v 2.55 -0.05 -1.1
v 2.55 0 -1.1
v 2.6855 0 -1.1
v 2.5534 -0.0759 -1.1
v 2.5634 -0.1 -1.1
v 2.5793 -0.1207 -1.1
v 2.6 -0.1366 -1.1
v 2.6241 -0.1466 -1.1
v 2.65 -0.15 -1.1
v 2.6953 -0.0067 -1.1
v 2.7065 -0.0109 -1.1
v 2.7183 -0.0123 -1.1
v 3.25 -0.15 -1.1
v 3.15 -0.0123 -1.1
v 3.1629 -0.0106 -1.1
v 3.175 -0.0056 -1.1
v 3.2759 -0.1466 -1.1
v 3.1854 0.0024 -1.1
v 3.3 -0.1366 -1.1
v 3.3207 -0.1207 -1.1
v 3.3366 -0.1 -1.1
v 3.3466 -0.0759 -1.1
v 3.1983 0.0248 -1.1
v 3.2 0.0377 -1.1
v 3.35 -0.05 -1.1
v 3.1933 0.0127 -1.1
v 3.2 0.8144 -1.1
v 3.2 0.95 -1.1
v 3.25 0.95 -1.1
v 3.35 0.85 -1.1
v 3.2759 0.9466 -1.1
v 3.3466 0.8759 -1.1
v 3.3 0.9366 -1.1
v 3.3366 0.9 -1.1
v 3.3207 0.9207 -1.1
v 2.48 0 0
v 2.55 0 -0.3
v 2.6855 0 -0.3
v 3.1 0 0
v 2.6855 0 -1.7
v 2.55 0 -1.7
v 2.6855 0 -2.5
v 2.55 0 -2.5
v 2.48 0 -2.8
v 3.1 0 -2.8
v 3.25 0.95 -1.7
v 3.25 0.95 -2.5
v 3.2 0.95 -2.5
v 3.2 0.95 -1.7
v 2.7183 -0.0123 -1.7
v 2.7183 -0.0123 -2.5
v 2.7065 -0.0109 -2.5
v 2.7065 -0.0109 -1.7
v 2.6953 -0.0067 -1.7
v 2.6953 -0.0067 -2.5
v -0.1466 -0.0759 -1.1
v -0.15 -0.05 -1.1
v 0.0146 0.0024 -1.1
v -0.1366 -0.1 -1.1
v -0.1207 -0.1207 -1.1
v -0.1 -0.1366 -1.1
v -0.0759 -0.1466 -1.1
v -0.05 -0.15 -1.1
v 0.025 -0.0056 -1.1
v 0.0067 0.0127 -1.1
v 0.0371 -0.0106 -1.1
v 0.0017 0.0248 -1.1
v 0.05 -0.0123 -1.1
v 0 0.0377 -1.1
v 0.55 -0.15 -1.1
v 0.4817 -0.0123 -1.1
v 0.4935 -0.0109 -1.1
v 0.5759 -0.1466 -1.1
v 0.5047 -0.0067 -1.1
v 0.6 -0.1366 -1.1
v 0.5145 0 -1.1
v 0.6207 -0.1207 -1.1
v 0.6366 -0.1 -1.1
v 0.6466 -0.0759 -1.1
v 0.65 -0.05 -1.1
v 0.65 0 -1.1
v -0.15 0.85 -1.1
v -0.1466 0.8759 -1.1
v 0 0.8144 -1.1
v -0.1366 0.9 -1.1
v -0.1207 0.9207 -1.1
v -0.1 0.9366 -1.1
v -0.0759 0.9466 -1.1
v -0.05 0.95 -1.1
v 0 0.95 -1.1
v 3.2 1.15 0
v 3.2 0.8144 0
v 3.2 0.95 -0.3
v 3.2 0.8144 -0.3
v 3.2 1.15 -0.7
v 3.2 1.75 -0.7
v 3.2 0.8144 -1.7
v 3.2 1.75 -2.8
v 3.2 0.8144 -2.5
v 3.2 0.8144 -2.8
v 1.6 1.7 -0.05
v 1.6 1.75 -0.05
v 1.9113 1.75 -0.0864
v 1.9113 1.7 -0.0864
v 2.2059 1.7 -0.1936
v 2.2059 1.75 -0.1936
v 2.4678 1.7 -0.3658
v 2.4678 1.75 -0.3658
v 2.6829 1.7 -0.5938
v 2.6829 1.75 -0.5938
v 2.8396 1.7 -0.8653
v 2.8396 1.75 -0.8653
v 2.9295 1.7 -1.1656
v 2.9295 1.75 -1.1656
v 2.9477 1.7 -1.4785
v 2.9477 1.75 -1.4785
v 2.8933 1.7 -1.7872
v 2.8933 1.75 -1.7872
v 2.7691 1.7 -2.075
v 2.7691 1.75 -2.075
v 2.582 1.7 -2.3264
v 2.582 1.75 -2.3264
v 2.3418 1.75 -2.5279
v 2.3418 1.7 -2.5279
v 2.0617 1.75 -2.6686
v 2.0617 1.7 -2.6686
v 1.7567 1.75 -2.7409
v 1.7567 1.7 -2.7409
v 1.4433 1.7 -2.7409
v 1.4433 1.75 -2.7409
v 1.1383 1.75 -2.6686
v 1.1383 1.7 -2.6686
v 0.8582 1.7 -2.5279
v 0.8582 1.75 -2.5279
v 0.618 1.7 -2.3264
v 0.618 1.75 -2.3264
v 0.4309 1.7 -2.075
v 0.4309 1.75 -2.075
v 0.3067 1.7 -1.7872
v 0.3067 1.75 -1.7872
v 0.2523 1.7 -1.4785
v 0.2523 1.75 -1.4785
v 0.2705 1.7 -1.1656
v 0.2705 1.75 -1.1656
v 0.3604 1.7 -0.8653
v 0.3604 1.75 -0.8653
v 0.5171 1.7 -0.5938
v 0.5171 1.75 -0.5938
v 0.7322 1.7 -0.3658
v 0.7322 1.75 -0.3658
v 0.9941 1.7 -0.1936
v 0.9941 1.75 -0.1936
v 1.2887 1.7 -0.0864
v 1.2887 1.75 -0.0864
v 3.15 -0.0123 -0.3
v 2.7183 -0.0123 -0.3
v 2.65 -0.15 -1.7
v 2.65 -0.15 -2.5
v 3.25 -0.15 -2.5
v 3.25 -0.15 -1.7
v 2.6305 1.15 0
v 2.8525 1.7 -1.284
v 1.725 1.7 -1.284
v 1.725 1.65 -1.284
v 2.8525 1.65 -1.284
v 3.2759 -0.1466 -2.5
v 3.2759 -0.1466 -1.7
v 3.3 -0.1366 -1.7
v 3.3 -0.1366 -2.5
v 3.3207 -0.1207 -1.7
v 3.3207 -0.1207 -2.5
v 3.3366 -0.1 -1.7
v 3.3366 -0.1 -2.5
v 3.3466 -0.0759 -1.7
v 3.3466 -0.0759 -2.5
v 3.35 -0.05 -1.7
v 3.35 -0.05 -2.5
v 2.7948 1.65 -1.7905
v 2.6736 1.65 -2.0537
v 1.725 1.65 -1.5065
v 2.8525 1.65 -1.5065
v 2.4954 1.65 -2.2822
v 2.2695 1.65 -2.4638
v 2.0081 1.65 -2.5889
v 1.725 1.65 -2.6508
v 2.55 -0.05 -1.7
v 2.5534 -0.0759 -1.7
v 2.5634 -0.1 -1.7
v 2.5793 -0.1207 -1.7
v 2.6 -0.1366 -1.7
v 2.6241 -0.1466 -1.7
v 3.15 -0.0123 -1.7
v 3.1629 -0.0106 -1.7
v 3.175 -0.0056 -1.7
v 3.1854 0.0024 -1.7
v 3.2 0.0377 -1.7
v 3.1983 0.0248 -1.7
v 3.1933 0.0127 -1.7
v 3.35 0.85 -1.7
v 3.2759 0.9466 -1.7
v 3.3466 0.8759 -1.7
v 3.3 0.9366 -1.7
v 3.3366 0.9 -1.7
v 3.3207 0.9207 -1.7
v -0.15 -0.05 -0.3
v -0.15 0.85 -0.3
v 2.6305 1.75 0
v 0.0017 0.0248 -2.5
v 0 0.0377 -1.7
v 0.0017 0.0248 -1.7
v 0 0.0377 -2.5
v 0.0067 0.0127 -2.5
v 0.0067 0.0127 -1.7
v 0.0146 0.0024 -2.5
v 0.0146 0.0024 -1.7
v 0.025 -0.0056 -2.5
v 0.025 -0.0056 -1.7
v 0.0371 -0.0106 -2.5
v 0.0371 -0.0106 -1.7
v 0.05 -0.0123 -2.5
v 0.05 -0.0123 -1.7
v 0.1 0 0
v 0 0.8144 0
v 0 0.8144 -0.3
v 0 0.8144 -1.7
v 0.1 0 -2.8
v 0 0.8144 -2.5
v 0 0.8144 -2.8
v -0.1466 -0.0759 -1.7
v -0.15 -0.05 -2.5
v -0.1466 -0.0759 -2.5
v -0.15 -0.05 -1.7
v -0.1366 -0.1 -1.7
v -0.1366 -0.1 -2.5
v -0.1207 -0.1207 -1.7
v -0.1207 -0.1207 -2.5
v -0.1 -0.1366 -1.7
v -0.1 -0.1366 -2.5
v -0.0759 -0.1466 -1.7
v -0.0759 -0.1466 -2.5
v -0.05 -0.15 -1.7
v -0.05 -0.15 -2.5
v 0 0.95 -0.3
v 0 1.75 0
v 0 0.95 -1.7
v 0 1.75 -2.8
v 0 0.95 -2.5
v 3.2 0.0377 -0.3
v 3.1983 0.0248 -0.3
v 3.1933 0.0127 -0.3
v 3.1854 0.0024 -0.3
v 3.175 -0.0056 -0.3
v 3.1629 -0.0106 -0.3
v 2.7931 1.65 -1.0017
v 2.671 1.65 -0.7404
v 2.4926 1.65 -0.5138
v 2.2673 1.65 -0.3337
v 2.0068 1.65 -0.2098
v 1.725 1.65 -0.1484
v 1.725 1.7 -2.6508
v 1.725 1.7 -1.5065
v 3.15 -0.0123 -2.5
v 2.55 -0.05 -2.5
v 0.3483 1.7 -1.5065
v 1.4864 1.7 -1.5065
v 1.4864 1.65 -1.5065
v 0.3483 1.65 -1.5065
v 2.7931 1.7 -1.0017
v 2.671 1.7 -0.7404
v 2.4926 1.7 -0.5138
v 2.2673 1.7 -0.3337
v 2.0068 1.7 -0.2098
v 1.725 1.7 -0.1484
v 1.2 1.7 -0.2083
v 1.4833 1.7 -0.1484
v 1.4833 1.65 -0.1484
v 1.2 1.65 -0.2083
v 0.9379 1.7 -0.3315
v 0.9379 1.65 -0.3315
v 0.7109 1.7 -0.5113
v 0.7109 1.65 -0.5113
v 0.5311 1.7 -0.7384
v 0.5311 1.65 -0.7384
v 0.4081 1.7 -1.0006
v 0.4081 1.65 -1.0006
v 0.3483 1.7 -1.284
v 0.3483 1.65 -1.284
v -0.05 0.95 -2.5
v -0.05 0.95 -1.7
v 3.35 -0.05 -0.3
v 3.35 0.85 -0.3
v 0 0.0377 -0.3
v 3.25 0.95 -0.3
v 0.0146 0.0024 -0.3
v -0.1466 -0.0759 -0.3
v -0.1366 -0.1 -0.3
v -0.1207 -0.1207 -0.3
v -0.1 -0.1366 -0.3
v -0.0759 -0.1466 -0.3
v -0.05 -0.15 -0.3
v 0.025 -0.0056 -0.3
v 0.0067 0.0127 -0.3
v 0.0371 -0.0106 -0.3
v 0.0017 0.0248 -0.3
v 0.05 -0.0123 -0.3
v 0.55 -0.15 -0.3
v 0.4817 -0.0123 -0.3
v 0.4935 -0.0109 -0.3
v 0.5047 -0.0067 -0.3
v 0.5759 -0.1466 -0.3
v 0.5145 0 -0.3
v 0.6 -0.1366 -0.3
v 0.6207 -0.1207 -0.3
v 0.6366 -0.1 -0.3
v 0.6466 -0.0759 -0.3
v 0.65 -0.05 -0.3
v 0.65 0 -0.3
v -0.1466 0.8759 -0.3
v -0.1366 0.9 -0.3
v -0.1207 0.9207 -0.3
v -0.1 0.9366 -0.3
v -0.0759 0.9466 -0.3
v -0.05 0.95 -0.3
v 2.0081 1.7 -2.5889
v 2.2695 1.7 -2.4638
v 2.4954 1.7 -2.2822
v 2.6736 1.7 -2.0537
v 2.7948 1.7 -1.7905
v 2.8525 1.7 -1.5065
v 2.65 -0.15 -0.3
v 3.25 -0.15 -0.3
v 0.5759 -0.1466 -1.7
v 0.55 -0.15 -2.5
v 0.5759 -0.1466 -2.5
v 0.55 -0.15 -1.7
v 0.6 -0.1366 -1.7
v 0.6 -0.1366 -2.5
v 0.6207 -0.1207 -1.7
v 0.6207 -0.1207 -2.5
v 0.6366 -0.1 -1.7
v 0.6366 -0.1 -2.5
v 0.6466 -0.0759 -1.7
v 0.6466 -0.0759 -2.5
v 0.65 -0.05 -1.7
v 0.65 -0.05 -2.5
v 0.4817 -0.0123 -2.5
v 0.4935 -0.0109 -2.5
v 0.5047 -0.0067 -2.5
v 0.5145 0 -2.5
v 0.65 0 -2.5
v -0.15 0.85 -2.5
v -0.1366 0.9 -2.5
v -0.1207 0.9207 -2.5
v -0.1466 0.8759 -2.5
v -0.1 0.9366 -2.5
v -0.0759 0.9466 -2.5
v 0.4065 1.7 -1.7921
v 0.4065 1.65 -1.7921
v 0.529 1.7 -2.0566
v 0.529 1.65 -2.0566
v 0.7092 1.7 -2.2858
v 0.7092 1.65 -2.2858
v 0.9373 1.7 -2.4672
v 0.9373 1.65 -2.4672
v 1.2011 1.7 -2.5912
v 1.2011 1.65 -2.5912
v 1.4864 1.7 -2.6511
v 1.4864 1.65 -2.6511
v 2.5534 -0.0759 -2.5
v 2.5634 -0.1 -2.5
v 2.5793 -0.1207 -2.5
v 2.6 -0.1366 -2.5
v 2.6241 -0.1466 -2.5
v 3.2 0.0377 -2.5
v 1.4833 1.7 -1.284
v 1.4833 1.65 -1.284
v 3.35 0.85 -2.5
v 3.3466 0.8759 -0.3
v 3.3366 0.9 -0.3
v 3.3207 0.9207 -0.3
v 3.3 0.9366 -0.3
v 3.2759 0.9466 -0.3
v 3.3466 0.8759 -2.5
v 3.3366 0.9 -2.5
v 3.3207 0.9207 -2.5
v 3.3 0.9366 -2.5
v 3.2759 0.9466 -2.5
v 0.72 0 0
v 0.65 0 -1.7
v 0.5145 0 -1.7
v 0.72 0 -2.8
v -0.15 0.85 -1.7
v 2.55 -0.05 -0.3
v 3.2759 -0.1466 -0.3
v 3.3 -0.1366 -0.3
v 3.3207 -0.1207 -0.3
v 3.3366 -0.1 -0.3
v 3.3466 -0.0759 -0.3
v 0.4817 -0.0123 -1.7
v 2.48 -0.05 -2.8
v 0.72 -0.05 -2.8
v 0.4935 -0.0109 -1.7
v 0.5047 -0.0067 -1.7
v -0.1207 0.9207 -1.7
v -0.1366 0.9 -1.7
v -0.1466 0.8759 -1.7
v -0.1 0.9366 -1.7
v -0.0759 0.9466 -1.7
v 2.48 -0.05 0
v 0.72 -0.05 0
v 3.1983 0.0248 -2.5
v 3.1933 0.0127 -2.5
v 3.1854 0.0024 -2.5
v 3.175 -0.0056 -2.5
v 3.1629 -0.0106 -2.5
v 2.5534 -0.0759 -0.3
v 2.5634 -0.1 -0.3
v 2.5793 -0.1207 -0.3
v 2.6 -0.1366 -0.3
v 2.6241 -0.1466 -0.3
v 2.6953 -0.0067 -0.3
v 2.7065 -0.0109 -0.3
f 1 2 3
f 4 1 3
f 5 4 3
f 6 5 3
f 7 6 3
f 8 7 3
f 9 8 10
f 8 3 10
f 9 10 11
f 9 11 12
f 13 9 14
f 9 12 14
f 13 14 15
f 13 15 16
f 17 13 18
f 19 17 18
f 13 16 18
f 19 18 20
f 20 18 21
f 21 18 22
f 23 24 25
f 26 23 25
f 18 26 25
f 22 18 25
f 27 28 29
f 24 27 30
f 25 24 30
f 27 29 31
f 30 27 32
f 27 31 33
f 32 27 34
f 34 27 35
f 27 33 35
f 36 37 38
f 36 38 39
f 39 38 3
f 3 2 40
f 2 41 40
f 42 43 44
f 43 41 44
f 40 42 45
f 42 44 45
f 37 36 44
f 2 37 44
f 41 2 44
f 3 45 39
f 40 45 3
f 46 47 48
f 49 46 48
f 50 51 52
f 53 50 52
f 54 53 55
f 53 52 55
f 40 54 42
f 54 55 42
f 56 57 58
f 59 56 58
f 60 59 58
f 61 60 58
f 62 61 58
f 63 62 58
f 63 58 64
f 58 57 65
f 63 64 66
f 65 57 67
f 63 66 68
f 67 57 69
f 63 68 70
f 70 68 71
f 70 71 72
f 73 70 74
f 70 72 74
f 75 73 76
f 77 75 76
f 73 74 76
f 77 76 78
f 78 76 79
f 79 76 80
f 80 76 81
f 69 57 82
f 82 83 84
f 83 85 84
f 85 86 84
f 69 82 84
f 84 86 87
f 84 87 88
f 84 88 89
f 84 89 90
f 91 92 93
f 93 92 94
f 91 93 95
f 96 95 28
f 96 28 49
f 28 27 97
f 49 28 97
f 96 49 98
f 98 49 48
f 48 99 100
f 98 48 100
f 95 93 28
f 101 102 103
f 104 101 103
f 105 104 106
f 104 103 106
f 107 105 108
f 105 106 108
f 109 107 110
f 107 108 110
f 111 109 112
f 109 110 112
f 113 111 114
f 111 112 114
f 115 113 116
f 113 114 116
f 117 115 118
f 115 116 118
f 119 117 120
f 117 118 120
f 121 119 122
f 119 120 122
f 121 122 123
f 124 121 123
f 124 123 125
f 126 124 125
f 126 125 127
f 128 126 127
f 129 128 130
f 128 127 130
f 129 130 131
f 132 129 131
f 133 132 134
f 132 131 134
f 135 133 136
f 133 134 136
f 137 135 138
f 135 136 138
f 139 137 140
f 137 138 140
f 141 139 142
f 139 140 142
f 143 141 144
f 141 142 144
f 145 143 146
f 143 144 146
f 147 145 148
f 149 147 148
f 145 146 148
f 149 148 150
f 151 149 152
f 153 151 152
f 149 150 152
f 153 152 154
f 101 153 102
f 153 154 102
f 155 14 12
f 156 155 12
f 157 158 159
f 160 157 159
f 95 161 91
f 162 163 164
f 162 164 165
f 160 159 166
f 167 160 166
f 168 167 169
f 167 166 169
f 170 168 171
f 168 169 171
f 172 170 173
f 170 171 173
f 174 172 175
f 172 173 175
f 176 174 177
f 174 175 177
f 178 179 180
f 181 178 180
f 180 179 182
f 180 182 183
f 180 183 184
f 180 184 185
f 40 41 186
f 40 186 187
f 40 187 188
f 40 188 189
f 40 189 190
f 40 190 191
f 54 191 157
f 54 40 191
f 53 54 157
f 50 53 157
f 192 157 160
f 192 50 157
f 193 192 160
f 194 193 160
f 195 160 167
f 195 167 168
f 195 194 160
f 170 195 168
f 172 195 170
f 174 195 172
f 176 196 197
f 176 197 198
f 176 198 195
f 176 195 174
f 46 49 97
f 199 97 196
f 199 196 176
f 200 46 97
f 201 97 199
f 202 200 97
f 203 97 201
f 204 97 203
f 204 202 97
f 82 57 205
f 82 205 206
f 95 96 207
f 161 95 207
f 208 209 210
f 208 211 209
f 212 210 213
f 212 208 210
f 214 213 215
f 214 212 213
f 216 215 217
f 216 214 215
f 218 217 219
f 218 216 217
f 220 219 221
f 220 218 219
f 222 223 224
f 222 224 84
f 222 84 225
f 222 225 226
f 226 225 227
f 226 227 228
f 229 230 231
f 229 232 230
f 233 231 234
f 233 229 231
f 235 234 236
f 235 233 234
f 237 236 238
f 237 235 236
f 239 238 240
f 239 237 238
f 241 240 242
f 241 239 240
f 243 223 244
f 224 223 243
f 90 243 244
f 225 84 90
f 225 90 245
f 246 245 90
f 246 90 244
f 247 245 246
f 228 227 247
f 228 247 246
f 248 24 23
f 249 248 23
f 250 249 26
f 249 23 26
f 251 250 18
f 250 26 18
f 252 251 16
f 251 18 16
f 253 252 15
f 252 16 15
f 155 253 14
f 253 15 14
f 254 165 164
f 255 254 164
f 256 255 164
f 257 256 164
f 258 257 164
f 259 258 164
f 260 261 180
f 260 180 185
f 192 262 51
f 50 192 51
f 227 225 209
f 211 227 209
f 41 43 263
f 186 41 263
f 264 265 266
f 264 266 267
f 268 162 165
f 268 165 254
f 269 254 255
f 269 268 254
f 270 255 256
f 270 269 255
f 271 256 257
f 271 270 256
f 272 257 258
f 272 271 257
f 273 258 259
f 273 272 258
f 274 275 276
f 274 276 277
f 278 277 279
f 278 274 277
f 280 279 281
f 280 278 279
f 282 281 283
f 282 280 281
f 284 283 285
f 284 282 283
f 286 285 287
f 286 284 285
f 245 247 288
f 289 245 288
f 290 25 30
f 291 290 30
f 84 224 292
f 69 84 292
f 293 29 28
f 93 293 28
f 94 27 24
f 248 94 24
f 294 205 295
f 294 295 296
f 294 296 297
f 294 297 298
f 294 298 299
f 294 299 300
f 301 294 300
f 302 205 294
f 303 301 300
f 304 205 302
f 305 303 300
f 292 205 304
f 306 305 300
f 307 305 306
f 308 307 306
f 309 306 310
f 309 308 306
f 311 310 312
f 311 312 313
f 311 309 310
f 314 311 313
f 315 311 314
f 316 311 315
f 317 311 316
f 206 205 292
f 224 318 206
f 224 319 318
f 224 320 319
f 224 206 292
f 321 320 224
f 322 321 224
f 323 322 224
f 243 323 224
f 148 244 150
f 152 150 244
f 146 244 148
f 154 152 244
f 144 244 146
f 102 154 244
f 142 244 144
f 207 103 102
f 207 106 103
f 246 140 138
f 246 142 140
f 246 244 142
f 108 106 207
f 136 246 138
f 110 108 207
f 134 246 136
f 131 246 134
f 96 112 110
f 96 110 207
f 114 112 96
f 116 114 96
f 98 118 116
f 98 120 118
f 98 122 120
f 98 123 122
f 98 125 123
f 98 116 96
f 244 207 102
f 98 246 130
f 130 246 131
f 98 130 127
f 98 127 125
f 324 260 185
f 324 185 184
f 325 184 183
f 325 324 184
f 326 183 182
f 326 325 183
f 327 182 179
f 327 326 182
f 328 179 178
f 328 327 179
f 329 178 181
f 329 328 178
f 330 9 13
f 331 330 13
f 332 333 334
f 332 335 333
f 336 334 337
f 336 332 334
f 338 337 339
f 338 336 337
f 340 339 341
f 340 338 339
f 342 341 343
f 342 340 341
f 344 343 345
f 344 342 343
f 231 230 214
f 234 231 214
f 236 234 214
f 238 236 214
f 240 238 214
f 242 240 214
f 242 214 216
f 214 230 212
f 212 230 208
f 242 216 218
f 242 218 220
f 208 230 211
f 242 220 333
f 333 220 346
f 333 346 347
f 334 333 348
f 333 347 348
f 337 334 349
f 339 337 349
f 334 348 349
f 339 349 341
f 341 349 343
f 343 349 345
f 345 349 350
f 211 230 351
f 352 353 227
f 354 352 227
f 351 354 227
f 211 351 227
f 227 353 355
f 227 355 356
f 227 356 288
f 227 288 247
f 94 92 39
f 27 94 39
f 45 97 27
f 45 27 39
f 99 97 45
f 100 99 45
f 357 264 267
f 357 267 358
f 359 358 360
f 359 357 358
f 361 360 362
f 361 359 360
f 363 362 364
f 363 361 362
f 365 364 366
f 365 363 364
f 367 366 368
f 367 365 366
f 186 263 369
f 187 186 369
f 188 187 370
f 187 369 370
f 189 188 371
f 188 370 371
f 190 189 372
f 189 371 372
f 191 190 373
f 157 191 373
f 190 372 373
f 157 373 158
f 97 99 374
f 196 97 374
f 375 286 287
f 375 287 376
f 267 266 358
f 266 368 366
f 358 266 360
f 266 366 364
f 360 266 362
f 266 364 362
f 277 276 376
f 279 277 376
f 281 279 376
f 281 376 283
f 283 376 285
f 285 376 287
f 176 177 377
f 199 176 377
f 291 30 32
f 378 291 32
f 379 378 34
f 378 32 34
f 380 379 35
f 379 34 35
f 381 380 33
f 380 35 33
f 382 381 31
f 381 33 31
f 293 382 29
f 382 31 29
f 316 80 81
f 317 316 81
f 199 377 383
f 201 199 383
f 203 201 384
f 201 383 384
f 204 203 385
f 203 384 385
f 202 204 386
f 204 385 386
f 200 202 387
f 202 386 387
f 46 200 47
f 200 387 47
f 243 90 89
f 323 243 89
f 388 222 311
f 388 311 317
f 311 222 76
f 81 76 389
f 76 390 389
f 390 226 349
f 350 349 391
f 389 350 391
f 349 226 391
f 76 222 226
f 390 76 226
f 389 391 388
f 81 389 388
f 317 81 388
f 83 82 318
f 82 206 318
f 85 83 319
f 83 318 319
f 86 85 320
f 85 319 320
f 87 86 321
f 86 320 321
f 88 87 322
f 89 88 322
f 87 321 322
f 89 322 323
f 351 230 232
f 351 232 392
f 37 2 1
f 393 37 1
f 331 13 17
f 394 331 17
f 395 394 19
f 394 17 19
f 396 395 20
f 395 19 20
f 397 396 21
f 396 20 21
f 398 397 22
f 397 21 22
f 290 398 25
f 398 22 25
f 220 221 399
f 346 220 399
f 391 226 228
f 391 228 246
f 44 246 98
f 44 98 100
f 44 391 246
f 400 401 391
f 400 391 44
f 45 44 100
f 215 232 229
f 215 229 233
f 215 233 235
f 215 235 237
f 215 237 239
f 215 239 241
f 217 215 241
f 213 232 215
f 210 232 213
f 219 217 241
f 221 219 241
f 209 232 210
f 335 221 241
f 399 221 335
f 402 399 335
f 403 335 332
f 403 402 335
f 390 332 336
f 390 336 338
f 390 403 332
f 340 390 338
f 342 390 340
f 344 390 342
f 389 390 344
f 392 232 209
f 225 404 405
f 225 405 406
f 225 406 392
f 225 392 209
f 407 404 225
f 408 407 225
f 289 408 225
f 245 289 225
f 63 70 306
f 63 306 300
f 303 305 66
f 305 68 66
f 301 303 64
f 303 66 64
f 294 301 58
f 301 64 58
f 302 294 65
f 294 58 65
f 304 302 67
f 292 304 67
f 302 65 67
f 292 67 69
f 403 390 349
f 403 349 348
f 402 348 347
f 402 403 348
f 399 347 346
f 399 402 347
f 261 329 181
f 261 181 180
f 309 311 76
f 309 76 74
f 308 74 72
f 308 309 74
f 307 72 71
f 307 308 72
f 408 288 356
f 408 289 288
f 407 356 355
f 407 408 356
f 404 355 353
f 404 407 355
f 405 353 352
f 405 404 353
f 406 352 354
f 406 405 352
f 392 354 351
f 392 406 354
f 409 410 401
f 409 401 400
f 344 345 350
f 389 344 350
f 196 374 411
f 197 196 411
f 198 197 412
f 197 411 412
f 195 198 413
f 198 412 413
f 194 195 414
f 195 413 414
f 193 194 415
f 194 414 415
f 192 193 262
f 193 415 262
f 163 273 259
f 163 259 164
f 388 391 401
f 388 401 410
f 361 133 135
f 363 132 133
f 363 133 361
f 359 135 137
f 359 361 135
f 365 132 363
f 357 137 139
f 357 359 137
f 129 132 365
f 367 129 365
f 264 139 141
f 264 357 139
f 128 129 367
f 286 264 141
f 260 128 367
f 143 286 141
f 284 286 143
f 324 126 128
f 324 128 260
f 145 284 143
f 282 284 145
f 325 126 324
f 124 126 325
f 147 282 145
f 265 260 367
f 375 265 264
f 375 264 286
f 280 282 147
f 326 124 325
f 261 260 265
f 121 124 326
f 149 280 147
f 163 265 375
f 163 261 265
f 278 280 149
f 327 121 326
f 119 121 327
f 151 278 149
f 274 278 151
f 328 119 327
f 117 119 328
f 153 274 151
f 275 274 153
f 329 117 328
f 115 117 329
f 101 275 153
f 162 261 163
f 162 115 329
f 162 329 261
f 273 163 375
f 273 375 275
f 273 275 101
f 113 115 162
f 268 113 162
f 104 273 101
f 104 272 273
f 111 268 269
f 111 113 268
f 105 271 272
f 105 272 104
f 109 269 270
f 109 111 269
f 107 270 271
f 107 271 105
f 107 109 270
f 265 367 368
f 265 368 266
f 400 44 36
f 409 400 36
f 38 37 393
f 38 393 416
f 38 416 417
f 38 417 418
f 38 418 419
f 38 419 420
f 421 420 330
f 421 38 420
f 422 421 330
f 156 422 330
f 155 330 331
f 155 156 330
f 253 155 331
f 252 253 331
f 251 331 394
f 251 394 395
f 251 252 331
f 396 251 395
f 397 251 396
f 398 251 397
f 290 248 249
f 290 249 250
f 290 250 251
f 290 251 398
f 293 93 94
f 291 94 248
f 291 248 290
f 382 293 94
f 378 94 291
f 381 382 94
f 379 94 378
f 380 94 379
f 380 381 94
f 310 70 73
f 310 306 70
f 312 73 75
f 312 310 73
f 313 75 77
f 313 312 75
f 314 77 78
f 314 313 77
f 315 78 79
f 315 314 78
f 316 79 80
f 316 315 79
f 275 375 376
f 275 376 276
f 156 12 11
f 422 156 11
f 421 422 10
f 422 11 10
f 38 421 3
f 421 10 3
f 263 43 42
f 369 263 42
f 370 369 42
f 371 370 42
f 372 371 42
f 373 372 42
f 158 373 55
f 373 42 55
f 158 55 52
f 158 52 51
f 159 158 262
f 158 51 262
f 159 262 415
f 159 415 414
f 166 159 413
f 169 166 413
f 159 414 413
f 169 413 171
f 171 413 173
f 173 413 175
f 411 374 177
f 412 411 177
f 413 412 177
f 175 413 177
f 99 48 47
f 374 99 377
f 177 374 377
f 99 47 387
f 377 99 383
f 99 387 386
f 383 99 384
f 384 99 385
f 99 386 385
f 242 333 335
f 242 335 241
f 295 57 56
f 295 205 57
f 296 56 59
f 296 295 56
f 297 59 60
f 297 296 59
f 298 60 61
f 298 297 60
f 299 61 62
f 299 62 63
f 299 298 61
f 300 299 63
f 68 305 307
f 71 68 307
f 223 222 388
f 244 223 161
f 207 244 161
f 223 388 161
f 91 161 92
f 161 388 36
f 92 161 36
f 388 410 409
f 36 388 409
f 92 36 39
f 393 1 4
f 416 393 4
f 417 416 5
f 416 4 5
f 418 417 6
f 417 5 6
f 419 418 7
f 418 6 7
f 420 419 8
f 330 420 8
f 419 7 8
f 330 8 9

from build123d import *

# Parameters (mm, degrees)
SKETCH1_W              = 3.2
SKETCH1_H              = 2.8
BOSS_EXTRUDE1_DEPTH    = 1.75
CHAMFER1_SIZE          = 0.1
CHAMFER1_SIZE2         = 0.814434643
SKETCH3_W              = 0.8
SKETCH3_H              = 1.1
BOSS_EXTRUDE2_DEPTH    = 0.8
FILLET1_R              = 0.1
FILLET2_R              = 0.1
FILLET3_R              = 0.1
CUT_EXTRUDE3_DEPTH     = 1
FILLET5_R              = 0.05
FILLET6_R              = 0.05
LPATTERN1_COUNT        = 2
LPATTERN1_PITCH        = 1.4
FILLET1_OF_LPATTERN1_R = 0.1
FILLET2_OF_LPATTERN1_R = 0.1
FILLET3_OF_LPATTERN1_R = 0.1
FILLET5_OF_LPATTERN1_R = 0.05
FILLET6_OF_LPATTERN1_R = 0.05
CHAMFER2_SIZE          = 0.1
CHAMFER2_SIZE2         = 0.814434643
MIRROR2_START          = -2.5
MIRROR2_DEPTH          = 0.8
MIRROR2_START_2        = -1.1
MIRROR2_2_DEPTH        = 0.8
SKETCH7_W              = 1.76
SKETCH7_H              = 2.8
BOSS_EXTRUDE4_DEPTH    = 0.05
CUT_EXTRUDE4_DEPTH     = 0.6
SKETCH9_R              = 1.35
CUT_EXTRUDE5_DEPTH     = 0.05
CUT_EXTRUDE6_DEPTH     = 0.05


# Read off the part's stored shape, not the designer's step: Mirror2
with BuildPart() as part:
    # Sketch1 → Boss-Extrude1 (new body)
    with BuildSketch(Plane(origin=(0, 0, 0), x_dir=(1, 0, 0), z_dir=(0, 1, 0))):
        with Locations((1.6, 1.4)):
            Rectangle(SKETCH1_W, SKETCH1_H)
    extrude(amount=BOSS_EXTRUDE1_DEPTH)

    # Chamfer1
    chamfer1_edges = [part.edges().sort_by_distance(p)[0] for p in [
        (0, 0, -1.4),
    ]]
    chamfer1_side = [part.faces().sort_by_distance(p)[0] for p in [
        (1.6, 0, -1.4),
    ]]
    chamfer(chamfer1_edges, length=CHAMFER1_SIZE, length2=CHAMFER1_SIZE2, reference=chamfer1_side[0])

    # Sketch3 → Boss-Extrude2 (add)
    with BuildSketch(Plane(origin=(0, 0, -2.5), x_dir=(-1, 0, 0), z_dir=(0, 0, -1))):
        with Locations((-0.25, 0.4)):
            Rectangle(SKETCH3_W, SKETCH3_H)
    boss_extrude2 = extrude(amount=-BOSS_EXTRUDE2_DEPTH)

    # Fillet1
    fillet1_edges = [part.edges().sort_by_distance(p)[0] for p in [
        (-0.15, 0.95, -2.1),
    ]]
    fillet(fillet1_edges, radius=FILLET1_R)

    # Fillet2
    fillet2_edges = [part.edges().sort_by_distance(p)[0] for p in [
        (-0.15, -0.15, -2.1),
    ]]
    fillet(fillet2_edges, radius=FILLET2_R)

    # Fillet3
    fillet3_edges = [part.edges().sort_by_distance(p)[0] for p in [
        (0.65, -0.15, -2.1),
    ]]
    fillet(fillet3_edges, radius=FILLET3_R)

    # Sketch6 → Cut-Extrude3 (cut)
    with BuildSketch(Plane.XY.offset(-1.7)):
        Polygon((0, 0.814434643), (0, -0.012278456), (0.514539268, -0.012278456), (0.514539268, 0), (0.1, 0), align=None)
    cut_extrude3 = extrude(amount=-CUT_EXTRUDE3_DEPTH, mode=Mode.SUBTRACT)

    # Fillet5
    fillet5_edges = [part.edges().sort_by_distance(p)[0] for p in [
        (0, -0.012278456, -2.1),
    ]]
    fillet(fillet5_edges, radius=FILLET5_R)

    # Fillet6
    # the kernel refuses this fillet: 0.05 mm, written as the material it adds along each edge
    with BuildSketch(Plane(origin=(0.514539268, -0.012278456, -1.7), x_dir=(-1, 0, 0), z_dir=(0, 0, -1))) as fillet6_piece_1:
        with BuildLine():
            CenterArc((0.032818975, 0.05), FILLET6_R, 228.975665985, 41.024334015)
            Line((0, 0.012278456), (-0.00065638, 0.011524025))
            ThreePointArc((-0.00065638, 0.011524025), (-0.001, 0.006139228), (-0.001, 0))
            Line((-0.001, 0), (0, -0.001))
            Line((0, -0.001), (0.032818975, -0.001))
            Line((0.032818975, -0.001), (0.032818975, 0))
        make_face()
    extrude(amount=0.8)

    # LPattern1: Boss-Extrude2, Cut-Extrude3 ×2
    with Locations(*[(0, 0, i * LPATTERN1_PITCH) for i in range(1, LPATTERN1_COUNT)]):
        add(boss_extrude2)
        add(cut_extrude3, mode=Mode.SUBTRACT)

    # Fillet1 of LPattern1
    fillet1_of_lpattern1_edges = [part.edges().sort_by_distance(p)[0] for p in [
        (-0.15, 0.95, -0.7),
    ]]
    fillet(fillet1_of_lpattern1_edges, radius=FILLET1_OF_LPATTERN1_R)

    # Fillet2 of LPattern1
    fillet2_of_lpattern1_edges = [part.edges().sort_by_distance(p)[0] for p in [
        (-0.15, -0.15, -0.7),
    ]]
    fillet(fillet2_of_lpattern1_edges, radius=FILLET2_OF_LPATTERN1_R)

    # Fillet3 of LPattern1
    fillet3_of_lpattern1_edges = [part.edges().sort_by_distance(p)[0] for p in [
        (0.65, -0.15, -0.7),
    ]]
    fillet(fillet3_of_lpattern1_edges, radius=FILLET3_OF_LPATTERN1_R)

    # Fillet5 of LPattern1
    fillet5_of_lpattern1_edges = [part.edges().sort_by_distance(p)[0] for p in [
        (0, -0.012278456, -0.7),
    ]]
    fillet(fillet5_of_lpattern1_edges, radius=FILLET5_OF_LPATTERN1_R)

    # Fillet6 of LPattern1
    # the kernel refuses this fillet: 0.05 mm, written as the material it adds along each edge
    with BuildSketch(Plane(origin=(0.514539268, -0.012278456, -0.3), x_dir=(-1, 0, 0), z_dir=(0, 0, -1))) as fillet6_of_lpattern1_piece_1:
        with BuildLine():
            CenterArc((0.032818975, 0.05), FILLET6_OF_LPATTERN1_R, 228.975665985, 41.024334015)
            Line((0, 0.012278456), (-0.00065638, 0.011524025))
            ThreePointArc((-0.00065638, 0.011524025), (-0.001, 0.006139228), (-0.001, 0))
            Line((-0.001, 0), (0, -0.001))
            Line((0, -0.001), (0.032818975, -0.001))
            Line((0.032818975, -0.001), (0.032818975, 0))
        make_face()
    extrude(amount=0.8)

    # Chamfer2
    chamfer2_edges = [part.edges().sort_by_distance(p)[0] for p in [
        (3.2, 0, -1.4),
    ]]
    chamfer2_side = [part.faces().sort_by_distance(p)[0] for p in [
        (1.677343693, 0, -1.4),
    ]]
    chamfer(chamfer2_edges, length=CHAMFER2_SIZE, length2=CHAMFER2_SIZE2, reference=chamfer2_side[0])

    # Mirror2 outline → Mirror2 (add)
    with BuildSketch(Plane.XY.offset(MIRROR2_START)):
        with BuildLine():
            Line((3.25, 0.95), (3.2, 0.95))
            Line((3.2, 0.95), (3.2, 0.037721544))
            ThreePointArc((3.2, 0.037721544), (3.185355339, 0.002366205), (3.15, -0.012278456))
            Line((3.15, -0.012278456), (2.718279707, -0.012278456))
            ThreePointArc((2.718279707, -0.012278456), (2.700759393, -0.009108346), (2.685460732, 0))
            Line((2.685460732, 0), (2.55, 0))
            Line((2.55, 0), (2.55, -0.05))
            ThreePointArc((2.55, -0.05), (2.579289322, -0.120710678), (2.65, -0.15))
            Line((2.65, -0.15), (3.25, -0.15))
            ThreePointArc((3.25, -0.15), (3.320710678, -0.120710678), (3.35, -0.05))
            Line((3.35, -0.05), (3.35, 0.85))
            ThreePointArc((3.35, 0.85), (3.320710678, 0.920710678), (3.25, 0.95))
        make_face()
    extrude(amount=MIRROR2_DEPTH)

    # Mirror2 2 outline → Mirror2 2 (add)
    with BuildSketch(Plane.XY.offset(MIRROR2_START_2)):
        with BuildLine():
            Line((3.25, 0.95), (3.2, 0.95))
            Line((3.2, 0.95), (3.2, 0.037721544))
            ThreePointArc((3.2, 0.037721544), (3.185355339, 0.002366205), (3.15, -0.012278456))
            Line((3.15, -0.012278456), (2.718279707, -0.012278456))
            ThreePointArc((2.718279707, -0.012278456), (2.700759393, -0.009108346), (2.685460732, 0))
            Line((2.685460732, 0), (2.55, 0))
            Line((2.55, 0), (2.55, -0.05))
            ThreePointArc((2.55, -0.05), (2.579289322, -0.120710678), (2.65, -0.15))
            Line((2.65, -0.15), (3.25, -0.15))
            ThreePointArc((3.25, -0.15), (3.320710678, -0.120710678), (3.35, -0.05))
            Line((3.35, -0.05), (3.35, 0.85))
            ThreePointArc((3.35, 0.85), (3.320710678, 0.920710678), (3.25, 0.95))
        make_face()
    extrude(amount=MIRROR2_2_DEPTH)

    # Sketch7 → Boss-Extrude4 (add)
    with BuildSketch(Plane.XZ):
        with Locations((1.6, -1.4)):
            Rectangle(SKETCH7_W, SKETCH7_H)
    extrude(amount=BOSS_EXTRUDE4_DEPTH)

    # Sketch8 → Cut-Extrude4 (cut)
    with BuildSketch(Plane(origin=(0, 1.75, 0), x_dir=(1, 0, 0), z_dir=(0, 1, 0))):
        Polygon((3.2, 0.7), (2.630450534, 0), (3.2, 0), align=None)
    extrude(amount=-CUT_EXTRUDE4_DEPTH, mode=Mode.SUBTRACT)

    # Sketch9 → Cut-Extrude5 (cut)
    with BuildSketch(Plane(origin=(0, 1.75, 0), x_dir=(1, 0, 0), z_dir=(0, 1, 0))):
        with Locations(Location((1.6, 1.4, 0), (0, 0, 270))):
            Circle(SKETCH9_R)
    extrude(amount=-CUT_EXTRUDE5_DEPTH, mode=Mode.SUBTRACT)

    # Sketch10 → Cut-Extrude6 (cut)
    with BuildSketch(Plane(origin=(0, 1.7, 0), x_dir=(1, 0, 0), z_dir=(0, 1, 0))):
        with BuildLine():
            Line((1.725002215, 1.506501375), (1.725002215, 2.650765477))
            ThreePointArc((1.725002215, 2.650765477), (2.495375318, 2.282237423), (2.852476462, 1.506501375))
            Line((2.852476462, 1.506501375), (1.725002215, 1.506501375))
        make_face()
        with BuildLine():
            Line((0.348304372, 1.283963542), (1.483343314, 1.283963542))
            Line((1.483343314, 1.283963542), (1.483343314, 0.148362024))
            ThreePointArc((1.483343314, 0.148362024), (0.710902302, 0.511342761), (0.348304372, 1.283963542))
        make_face()
        with BuildLine():
            Line((1.725002215, 0.148386564), (1.725002215, 1.283963542))
            Line((1.725002215, 1.283963542), (2.852476462, 1.283963542))
            ThreePointArc((2.852476462, 1.283963542), (2.492606098, 0.513762954), (1.725002215, 0.148386564))
        make_face()
        with BuildLine():
            Line((1.486402288, 2.65107156), (1.486402288, 1.506501375))
            Line((1.486402288, 1.506501375), (0.348304372, 1.506501375))
            ThreePointArc((0.348304372, 1.506501375), (0.709204455, 2.285758311), (1.486402288, 2.65107156))
        make_face()
    extrude(amount=-CUT_EXTRUDE6_DEPTH, mode=Mode.SUBTRACT)


solid = part.part
